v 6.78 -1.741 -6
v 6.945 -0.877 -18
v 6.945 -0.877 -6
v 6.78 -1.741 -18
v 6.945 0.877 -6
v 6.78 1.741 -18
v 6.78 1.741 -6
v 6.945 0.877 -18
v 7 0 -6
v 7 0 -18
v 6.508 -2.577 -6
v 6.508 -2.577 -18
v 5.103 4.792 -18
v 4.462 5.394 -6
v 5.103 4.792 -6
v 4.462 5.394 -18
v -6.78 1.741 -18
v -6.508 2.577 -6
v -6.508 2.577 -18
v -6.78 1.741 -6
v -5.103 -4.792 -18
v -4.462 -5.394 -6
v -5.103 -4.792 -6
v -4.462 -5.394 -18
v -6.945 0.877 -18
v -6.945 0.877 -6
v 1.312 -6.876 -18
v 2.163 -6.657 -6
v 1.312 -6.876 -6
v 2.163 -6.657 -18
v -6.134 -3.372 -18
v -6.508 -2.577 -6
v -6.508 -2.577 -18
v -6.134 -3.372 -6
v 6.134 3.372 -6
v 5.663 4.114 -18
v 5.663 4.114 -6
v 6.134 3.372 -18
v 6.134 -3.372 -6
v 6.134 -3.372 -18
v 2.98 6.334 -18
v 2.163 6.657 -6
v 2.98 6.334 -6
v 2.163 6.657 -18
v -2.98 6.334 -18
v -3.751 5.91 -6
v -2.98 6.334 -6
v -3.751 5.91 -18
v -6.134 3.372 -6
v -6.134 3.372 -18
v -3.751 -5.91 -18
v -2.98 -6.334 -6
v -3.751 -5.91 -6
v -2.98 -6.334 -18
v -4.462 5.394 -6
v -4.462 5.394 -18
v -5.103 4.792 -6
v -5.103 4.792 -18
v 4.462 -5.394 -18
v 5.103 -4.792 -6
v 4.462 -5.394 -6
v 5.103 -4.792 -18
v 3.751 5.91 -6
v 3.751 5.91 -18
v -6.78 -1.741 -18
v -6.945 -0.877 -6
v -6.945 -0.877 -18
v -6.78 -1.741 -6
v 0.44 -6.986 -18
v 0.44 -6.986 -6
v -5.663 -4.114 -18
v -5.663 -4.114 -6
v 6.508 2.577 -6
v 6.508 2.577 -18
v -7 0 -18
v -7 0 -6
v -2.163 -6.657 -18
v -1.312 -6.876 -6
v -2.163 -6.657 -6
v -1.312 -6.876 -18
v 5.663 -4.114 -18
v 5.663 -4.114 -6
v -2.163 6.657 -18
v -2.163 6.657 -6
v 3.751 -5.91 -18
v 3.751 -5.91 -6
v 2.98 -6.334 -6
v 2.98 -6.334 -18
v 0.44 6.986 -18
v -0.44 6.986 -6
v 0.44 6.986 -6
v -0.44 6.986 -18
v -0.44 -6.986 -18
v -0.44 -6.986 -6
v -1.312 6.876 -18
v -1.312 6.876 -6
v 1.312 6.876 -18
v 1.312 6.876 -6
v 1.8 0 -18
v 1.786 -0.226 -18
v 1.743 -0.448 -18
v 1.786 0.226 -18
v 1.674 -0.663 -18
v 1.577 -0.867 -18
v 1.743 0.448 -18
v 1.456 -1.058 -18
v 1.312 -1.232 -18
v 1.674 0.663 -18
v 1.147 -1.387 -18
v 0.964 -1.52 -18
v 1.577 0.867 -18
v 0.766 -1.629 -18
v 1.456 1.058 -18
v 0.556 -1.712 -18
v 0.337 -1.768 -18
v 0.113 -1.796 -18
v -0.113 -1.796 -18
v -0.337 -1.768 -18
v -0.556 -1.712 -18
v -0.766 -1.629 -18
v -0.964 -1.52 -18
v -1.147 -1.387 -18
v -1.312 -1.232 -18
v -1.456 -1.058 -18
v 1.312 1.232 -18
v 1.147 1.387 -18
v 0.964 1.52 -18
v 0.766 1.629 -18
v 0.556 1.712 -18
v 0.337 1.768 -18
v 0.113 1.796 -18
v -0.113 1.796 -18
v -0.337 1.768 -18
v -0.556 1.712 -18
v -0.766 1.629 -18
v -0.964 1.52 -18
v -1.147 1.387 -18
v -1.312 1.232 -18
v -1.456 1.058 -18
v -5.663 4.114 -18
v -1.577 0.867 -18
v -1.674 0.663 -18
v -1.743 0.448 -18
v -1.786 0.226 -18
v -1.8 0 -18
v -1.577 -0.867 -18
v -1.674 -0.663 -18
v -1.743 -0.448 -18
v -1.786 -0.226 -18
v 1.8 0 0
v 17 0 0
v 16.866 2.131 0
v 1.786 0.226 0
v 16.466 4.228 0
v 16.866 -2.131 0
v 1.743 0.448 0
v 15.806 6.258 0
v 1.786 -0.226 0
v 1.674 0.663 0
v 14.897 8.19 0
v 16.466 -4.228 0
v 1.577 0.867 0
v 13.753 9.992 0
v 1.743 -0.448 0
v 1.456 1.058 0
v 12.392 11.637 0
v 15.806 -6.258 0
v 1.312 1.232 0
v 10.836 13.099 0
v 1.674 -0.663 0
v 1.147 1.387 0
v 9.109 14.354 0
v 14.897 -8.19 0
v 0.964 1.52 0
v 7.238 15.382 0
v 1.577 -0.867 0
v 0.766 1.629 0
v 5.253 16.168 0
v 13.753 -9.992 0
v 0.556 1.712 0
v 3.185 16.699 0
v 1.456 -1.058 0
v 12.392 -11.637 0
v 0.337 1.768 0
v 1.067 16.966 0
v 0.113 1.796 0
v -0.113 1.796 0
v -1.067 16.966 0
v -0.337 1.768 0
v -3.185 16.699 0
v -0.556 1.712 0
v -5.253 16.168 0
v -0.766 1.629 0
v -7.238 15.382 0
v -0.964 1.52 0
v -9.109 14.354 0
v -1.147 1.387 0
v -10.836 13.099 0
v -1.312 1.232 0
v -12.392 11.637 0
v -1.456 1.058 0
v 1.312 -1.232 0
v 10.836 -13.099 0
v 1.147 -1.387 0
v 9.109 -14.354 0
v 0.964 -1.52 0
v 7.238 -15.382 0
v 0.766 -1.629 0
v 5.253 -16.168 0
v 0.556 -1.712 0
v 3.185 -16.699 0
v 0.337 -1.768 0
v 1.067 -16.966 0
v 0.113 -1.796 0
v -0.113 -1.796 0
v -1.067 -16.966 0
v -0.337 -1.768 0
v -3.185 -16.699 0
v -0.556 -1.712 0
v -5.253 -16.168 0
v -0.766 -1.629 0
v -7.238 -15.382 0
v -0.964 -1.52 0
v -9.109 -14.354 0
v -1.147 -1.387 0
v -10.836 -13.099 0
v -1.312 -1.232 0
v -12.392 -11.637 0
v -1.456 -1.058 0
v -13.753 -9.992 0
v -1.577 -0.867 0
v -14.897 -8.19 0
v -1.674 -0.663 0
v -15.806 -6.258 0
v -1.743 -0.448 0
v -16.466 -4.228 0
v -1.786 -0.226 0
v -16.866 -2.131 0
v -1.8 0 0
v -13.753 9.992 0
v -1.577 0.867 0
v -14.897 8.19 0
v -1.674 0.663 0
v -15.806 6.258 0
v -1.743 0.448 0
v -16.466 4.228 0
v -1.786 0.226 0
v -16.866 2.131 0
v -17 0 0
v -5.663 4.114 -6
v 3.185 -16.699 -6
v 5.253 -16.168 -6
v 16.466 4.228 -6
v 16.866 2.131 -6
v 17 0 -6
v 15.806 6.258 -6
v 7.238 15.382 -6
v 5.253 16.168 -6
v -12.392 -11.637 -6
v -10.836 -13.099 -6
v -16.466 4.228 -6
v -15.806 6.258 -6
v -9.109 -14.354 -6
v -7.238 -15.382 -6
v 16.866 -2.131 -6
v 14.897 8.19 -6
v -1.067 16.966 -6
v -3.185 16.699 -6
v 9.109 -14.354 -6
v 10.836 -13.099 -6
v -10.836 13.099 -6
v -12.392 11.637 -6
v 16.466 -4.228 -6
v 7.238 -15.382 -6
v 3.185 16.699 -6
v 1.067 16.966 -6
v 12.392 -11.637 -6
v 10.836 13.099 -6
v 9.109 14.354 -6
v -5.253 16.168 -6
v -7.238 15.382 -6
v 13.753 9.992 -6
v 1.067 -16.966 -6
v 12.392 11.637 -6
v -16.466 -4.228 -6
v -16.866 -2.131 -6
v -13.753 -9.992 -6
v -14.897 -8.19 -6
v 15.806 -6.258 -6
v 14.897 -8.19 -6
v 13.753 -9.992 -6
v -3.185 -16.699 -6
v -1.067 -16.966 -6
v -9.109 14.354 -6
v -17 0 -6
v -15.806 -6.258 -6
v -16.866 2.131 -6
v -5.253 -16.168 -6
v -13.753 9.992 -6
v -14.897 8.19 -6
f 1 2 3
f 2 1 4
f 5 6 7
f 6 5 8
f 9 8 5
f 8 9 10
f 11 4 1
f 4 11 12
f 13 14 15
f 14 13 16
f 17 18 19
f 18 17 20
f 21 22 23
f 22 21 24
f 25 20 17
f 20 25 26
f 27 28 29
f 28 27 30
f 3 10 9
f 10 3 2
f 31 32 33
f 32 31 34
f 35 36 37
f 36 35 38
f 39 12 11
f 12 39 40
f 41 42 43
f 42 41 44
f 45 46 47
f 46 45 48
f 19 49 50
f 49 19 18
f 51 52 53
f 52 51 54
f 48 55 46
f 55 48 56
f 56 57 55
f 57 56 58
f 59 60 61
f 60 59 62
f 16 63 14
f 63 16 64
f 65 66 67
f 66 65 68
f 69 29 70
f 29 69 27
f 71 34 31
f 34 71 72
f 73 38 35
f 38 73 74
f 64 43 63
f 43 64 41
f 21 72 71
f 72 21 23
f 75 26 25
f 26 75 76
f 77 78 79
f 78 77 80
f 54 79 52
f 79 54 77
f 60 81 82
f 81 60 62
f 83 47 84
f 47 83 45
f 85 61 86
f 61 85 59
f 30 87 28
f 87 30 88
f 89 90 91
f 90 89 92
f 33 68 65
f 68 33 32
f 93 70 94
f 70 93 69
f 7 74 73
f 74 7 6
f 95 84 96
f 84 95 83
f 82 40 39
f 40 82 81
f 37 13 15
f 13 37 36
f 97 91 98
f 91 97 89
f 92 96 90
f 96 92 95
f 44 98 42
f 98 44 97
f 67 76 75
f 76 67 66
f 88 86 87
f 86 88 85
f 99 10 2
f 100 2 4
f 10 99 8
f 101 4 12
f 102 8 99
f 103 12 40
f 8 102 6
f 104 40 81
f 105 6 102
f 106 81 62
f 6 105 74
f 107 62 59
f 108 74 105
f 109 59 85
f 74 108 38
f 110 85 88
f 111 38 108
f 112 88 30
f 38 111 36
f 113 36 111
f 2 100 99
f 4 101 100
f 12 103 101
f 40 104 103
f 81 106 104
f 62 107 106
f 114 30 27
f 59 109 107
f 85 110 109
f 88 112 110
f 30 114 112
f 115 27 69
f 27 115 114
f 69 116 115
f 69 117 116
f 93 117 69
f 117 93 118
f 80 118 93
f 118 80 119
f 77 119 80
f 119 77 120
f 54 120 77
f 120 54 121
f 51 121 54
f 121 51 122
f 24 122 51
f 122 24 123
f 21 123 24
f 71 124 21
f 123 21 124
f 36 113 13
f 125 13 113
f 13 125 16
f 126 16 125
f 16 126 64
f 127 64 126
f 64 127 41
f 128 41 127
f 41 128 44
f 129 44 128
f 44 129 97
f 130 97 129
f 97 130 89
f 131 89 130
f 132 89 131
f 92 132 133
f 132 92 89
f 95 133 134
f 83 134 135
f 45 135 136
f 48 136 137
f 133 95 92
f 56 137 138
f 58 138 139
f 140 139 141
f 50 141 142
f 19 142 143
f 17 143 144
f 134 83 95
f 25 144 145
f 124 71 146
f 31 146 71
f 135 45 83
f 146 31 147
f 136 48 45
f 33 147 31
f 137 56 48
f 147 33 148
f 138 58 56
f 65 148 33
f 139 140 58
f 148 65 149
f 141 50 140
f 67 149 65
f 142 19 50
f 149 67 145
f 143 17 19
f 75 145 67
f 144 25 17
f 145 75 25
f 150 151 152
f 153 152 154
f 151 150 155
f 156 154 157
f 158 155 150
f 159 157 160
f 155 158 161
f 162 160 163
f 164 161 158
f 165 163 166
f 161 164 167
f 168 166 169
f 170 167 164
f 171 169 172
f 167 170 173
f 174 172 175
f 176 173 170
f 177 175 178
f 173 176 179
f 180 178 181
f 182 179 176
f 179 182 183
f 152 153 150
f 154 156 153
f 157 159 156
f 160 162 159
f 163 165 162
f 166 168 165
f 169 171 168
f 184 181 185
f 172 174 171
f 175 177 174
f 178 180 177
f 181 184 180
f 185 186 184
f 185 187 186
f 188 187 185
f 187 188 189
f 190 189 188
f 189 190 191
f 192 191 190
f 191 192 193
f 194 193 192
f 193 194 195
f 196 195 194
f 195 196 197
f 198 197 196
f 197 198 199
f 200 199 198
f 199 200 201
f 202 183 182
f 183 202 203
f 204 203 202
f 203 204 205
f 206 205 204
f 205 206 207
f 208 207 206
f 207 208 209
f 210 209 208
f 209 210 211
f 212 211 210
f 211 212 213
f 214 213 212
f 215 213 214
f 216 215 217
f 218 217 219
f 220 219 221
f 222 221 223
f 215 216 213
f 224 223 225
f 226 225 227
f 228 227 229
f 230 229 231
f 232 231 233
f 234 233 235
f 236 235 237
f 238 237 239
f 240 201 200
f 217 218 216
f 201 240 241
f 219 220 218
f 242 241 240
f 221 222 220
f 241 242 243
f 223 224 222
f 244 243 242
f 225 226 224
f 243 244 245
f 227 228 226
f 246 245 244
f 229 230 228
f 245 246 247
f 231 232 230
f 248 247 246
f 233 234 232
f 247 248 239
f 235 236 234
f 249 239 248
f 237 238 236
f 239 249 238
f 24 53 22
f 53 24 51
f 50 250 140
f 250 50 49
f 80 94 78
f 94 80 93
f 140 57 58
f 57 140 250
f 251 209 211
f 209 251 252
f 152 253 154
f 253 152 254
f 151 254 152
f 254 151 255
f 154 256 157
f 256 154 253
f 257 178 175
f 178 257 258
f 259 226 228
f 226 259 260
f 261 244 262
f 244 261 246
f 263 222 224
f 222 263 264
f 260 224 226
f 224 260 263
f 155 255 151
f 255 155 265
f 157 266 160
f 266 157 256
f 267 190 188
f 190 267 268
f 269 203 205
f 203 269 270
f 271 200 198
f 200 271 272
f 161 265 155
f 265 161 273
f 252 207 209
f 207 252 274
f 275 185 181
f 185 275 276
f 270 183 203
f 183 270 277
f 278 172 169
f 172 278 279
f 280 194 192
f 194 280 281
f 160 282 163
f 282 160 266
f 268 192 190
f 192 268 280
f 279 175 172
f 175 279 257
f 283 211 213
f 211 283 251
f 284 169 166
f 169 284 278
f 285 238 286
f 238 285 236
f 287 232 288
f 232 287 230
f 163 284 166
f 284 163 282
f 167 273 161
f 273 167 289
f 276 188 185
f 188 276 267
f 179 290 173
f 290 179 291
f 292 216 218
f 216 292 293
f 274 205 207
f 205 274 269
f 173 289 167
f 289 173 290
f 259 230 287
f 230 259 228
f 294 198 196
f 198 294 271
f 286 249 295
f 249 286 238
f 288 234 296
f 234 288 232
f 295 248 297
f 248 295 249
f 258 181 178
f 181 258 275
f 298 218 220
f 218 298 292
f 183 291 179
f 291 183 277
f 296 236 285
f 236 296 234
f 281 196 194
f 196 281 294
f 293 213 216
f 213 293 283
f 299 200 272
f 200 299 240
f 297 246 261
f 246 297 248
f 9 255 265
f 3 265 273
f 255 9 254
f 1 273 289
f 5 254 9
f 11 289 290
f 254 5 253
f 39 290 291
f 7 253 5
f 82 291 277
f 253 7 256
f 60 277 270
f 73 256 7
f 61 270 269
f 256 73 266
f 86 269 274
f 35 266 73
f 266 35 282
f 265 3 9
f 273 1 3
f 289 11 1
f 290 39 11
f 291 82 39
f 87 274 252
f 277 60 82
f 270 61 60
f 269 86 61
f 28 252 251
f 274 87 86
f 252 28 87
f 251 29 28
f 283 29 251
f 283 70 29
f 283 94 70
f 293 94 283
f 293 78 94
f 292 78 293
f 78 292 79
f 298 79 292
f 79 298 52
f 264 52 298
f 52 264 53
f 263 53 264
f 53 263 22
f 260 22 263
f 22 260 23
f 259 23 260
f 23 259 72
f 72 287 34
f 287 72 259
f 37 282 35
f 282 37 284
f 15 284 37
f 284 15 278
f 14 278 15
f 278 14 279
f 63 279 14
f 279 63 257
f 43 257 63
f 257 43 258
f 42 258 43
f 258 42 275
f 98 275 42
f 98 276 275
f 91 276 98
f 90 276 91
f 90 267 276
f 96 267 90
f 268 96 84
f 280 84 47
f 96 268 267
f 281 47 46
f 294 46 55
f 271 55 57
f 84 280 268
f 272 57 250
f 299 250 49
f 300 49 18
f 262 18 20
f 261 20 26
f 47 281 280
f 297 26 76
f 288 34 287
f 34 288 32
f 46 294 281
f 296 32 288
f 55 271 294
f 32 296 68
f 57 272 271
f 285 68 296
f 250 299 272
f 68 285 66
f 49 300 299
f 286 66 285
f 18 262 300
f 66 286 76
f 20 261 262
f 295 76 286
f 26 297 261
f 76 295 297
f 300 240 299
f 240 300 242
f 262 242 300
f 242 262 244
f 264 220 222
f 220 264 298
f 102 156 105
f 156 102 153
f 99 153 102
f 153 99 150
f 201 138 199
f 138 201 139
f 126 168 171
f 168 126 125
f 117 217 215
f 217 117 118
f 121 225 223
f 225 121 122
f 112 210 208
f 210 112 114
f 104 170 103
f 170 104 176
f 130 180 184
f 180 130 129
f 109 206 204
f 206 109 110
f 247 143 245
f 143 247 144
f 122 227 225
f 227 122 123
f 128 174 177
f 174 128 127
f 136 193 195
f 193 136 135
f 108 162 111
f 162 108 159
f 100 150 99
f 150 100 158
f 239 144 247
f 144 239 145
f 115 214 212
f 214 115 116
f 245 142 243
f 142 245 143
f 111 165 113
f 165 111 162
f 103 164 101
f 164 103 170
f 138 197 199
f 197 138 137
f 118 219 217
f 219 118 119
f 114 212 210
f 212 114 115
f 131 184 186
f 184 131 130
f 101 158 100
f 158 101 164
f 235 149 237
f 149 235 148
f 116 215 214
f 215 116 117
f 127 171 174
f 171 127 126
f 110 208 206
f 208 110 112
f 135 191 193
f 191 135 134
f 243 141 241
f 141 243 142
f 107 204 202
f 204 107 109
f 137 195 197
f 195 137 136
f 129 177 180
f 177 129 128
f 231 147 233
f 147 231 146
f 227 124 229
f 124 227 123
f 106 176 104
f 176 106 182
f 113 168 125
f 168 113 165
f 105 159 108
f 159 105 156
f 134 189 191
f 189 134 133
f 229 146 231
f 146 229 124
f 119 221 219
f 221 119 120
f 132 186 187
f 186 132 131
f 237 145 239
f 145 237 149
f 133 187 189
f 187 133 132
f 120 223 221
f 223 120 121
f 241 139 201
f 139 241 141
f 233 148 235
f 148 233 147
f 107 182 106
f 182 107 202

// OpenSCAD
$fn = 50;


difference() {
	union() {
		translate(v = [0, 0, -18.0000000000]) {
			cylinder(h = 18, r = 7.0000000000);
		}
		translate(v = [0, 0, -6.0000000000]) {
			cylinder(h = 6, r = 17.0000000000);
		}
	}
	union() {
		#translate(v = [0, 0, -18]) {
			cylinder(h = 18, r = 1.8000000000);
		}
	}
}
